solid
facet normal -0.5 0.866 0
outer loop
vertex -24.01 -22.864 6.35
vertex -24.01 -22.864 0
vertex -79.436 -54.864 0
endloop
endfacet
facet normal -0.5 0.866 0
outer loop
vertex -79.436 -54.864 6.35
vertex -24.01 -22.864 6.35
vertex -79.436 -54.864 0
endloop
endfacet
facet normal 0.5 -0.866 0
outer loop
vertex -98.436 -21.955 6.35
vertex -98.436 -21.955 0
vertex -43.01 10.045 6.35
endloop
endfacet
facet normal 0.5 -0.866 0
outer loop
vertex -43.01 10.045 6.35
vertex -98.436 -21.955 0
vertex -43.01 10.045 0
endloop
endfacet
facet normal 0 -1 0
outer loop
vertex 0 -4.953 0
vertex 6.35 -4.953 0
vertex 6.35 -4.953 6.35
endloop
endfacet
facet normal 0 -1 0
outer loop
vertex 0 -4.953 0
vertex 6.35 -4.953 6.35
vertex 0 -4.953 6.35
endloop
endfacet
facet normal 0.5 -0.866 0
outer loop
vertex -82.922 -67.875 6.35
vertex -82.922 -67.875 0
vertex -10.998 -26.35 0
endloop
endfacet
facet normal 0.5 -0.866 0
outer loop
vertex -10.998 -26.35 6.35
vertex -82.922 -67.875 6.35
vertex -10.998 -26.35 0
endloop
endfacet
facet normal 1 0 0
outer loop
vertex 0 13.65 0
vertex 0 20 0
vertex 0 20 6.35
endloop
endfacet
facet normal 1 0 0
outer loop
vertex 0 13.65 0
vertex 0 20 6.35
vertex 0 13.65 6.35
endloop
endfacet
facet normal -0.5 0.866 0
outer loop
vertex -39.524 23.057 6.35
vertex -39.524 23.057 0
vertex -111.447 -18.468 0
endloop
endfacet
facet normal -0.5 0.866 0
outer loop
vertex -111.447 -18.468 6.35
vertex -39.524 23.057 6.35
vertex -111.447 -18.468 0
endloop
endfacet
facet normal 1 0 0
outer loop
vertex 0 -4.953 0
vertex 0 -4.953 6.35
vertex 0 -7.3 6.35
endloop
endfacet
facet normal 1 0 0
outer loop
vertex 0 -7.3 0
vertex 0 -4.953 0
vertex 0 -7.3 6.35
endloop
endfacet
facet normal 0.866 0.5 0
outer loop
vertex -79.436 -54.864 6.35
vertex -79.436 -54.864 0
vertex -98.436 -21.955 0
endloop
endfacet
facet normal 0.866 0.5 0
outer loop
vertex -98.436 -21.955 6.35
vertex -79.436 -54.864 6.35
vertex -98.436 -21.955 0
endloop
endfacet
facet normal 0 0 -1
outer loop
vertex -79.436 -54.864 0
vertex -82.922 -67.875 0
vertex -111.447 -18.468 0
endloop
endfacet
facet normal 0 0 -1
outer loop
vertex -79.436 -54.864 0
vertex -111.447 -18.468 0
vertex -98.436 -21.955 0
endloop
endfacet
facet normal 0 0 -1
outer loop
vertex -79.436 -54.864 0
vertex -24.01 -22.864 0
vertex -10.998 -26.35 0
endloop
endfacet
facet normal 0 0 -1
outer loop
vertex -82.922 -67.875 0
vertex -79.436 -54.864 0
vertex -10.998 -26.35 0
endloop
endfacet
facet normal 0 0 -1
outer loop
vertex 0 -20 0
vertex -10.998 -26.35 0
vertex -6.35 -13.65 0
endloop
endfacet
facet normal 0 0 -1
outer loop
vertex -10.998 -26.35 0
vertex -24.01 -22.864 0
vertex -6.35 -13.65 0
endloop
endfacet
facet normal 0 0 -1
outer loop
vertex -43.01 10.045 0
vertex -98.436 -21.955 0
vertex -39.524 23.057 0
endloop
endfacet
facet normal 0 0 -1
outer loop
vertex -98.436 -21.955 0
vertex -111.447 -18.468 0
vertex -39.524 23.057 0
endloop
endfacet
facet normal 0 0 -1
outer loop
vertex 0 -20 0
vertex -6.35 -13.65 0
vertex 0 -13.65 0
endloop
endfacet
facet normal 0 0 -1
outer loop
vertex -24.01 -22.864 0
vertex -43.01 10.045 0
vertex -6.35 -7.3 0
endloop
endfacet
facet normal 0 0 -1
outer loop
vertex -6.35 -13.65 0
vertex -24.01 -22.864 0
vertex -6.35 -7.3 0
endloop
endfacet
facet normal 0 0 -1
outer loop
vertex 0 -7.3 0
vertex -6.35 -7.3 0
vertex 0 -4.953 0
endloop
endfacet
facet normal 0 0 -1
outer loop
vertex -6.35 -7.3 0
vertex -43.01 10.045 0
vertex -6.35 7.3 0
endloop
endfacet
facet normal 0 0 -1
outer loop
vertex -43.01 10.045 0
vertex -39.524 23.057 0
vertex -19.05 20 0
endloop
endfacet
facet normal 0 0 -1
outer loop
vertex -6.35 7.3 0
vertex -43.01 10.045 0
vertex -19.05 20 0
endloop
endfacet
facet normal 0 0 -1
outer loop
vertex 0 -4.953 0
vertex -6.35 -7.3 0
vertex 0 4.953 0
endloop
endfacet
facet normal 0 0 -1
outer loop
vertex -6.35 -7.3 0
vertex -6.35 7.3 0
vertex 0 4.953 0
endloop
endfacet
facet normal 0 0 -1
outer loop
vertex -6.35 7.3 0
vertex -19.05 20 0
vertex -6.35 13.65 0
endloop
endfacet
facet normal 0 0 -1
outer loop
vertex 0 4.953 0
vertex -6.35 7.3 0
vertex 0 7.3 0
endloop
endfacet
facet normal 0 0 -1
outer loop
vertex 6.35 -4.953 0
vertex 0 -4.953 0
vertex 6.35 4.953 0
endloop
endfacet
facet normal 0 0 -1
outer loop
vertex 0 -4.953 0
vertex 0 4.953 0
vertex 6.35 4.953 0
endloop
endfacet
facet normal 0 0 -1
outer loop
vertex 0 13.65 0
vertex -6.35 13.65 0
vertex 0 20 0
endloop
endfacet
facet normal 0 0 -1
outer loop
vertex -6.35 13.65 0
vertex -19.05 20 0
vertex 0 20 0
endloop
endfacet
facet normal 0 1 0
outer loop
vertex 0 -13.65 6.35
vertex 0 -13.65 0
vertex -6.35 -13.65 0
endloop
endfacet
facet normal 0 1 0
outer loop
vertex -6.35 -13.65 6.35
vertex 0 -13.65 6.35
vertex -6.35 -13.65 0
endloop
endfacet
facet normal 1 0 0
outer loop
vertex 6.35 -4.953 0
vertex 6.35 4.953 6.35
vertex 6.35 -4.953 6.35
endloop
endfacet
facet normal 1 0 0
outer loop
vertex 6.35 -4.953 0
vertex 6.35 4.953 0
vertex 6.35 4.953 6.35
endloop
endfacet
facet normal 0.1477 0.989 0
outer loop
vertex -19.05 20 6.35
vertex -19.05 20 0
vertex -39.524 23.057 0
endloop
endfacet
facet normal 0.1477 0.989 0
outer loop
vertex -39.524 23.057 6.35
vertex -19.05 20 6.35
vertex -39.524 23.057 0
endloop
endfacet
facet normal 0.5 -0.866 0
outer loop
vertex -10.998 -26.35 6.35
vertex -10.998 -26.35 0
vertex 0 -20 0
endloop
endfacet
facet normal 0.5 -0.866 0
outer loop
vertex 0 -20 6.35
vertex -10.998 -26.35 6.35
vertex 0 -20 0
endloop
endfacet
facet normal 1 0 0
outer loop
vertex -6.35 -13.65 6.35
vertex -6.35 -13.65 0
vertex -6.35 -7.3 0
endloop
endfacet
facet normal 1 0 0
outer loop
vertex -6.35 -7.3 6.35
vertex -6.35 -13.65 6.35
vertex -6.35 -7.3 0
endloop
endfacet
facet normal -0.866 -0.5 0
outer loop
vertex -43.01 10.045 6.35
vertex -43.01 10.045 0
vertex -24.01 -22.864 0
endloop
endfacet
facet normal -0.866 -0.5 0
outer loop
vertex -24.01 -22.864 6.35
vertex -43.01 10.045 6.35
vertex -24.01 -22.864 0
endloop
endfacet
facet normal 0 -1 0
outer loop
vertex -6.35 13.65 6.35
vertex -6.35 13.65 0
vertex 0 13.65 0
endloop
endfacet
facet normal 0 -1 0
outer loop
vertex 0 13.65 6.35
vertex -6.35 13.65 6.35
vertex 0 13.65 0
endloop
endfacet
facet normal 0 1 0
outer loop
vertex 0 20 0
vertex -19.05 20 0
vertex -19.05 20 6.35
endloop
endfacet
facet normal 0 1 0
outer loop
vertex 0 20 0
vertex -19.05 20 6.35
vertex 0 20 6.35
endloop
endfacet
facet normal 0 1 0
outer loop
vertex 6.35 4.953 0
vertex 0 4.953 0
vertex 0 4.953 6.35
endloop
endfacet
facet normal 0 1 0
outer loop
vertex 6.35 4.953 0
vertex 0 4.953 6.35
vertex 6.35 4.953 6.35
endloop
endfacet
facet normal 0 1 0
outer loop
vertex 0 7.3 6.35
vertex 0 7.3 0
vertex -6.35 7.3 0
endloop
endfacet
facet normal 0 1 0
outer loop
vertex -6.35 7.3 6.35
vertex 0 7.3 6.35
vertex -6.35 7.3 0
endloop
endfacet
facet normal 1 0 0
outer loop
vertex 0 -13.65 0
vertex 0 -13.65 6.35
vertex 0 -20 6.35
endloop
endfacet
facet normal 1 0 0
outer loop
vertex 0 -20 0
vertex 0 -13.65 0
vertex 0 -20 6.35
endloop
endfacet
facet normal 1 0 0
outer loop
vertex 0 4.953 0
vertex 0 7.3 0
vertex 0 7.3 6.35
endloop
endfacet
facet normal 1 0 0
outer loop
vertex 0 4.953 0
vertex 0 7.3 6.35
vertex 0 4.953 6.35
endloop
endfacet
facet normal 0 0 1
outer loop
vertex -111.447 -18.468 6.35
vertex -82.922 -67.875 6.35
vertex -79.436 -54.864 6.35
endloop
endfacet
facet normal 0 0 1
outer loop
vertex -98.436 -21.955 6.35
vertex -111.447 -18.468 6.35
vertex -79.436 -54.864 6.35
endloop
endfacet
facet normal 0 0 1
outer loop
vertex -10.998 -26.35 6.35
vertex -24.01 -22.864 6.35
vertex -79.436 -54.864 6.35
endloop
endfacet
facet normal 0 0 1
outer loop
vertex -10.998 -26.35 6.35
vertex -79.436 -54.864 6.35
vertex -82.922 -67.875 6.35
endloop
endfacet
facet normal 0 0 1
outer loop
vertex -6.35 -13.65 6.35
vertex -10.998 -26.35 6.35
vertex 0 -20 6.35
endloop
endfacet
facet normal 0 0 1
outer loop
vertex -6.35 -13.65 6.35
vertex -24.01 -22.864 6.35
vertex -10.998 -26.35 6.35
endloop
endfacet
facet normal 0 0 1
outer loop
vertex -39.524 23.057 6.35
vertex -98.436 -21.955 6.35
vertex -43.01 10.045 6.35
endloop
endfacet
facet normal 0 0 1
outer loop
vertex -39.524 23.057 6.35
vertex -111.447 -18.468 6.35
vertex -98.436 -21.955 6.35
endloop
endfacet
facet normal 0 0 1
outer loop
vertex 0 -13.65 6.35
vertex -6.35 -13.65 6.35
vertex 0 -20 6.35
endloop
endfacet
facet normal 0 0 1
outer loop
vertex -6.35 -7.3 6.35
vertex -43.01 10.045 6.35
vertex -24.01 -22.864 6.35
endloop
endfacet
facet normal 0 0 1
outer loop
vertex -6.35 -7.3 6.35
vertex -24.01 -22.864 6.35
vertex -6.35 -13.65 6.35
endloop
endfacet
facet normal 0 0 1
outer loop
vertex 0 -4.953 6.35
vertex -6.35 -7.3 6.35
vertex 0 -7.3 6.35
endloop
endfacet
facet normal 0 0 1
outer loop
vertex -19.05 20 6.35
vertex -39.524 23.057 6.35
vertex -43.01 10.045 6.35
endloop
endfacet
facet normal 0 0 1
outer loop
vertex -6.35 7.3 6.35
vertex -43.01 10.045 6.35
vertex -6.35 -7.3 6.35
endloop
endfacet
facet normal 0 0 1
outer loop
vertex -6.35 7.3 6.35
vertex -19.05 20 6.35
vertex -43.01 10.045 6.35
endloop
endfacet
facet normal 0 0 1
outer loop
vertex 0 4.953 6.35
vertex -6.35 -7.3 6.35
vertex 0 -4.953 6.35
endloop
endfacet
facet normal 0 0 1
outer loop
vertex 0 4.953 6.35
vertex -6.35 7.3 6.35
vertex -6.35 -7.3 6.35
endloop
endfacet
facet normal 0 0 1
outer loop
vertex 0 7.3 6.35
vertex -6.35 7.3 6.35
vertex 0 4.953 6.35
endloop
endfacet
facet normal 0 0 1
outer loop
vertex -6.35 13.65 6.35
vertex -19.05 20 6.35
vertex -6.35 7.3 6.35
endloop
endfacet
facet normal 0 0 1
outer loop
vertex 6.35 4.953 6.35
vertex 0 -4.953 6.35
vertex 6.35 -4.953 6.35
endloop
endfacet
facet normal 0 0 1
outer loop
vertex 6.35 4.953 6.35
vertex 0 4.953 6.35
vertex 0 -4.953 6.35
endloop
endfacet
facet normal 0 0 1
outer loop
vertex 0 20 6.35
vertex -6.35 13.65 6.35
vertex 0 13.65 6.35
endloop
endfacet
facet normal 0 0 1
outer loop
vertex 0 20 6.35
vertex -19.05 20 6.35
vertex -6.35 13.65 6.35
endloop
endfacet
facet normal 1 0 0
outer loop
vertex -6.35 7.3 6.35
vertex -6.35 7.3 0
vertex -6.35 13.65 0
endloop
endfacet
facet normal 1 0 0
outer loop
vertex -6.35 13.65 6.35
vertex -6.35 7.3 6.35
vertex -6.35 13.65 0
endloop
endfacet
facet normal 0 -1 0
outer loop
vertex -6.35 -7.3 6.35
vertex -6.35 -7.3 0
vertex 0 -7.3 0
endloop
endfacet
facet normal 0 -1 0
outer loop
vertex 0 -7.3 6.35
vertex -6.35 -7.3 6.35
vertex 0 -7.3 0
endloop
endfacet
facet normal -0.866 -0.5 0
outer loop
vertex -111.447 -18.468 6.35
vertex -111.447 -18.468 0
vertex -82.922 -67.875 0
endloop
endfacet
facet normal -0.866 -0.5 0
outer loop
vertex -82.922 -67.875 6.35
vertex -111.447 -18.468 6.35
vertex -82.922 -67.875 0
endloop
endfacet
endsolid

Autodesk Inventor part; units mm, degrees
ref_plane "YZ Plane" through (0, 0, 0) normal (1, 0, 0) x (0, 1, 0)
ref_plane "XZ Plane" through (0, 0, 0) normal (0, 1, 0) x (-1, 0, 0)
ref_plane "XY Plane" through (0, 0, 0) normal (0, 0, 1) x (1, 0, 0)
sketch "Sketch1" plane through (0, 0, 0) normal (0, 0, 1) x (1, 0, 0)
  line L0 (-98.4355, -21.9546) -> (-43.0099, 10.0454)
  line L1 (-43.0099, 10.0454) -> (-24.0099, -22.8636)
  line L2 (-24.0099, -22.8636) -> (-79.4355, -54.8636)
  line L3 (-79.4355, -54.8636) -> (-98.4355, -21.9546)
  line L4 (-6.35, -7.3) -> (0, -7.3)
  line L5 (0, -7.3) -> (0, -13.65)
  line L6 (0, -13.65) -> (-6.35, -13.65)
  line L7 (-6.35, -13.65) -> (-6.35, -7.3)
  line L8 (6.35, -4.953) -> (0, -4.953)
  line L9 (0, -4.953) -> (0, 4.953)
  line L10 (0, 4.953) -> (6.35, 4.953)
  line L11 (6.35, 4.953) -> (6.35, -4.953)
  line L12 (-6.35, 13.65) -> (0, 13.65)
  line L13 (0, 13.65) -> (0, 7.3)
  line L14 (0, 7.3) -> (-6.35, 7.3)
  line L15 (-6.35, 7.3) -> (-6.35, 13.65)
  line L16 (0, -20) -> (-19.05, -20)
  line L17 (-19.05, -20) -> (-19.05, 20)
  line L18 (-19.05, 20) -> (0, 20)
  line L19 (0, 20) -> (0, -20)
  line L20 (-10.9985, -26.35) -> (-39.5235, 23.0567)
  line L21 (-39.5235, 23.0567) -> (-111.4469, -18.4683)
  line L22 (-111.4469, -18.4683) -> (-82.9219, -67.875)
  line L23 (-82.9219, -67.875) -> (-10.9985, -26.35)
  line L24 (-10.9985, -26.35) -> (0, -20)
  line L25 (-19.05, 20) -> (-39.5235, 23.0567)
  point P0 (0, 0)
  point P1 (0, 0)
  dimension "d0" = 6.35
  dimension "d2" = 9.906
  dimension "d3" = 40
  dimension "d4" = 6.35
  dimension "d5" = 6.35
  dimension "d6" = 6.35
  dimension "d7" = 38
  dimension "d8" = 64
  dimension "d9" = 9.525
  dimension "d10" = 30
  dimension "d11" = 19.05
  dimension "d12" = 12.7
extrude "Extrusion1" add sketch "Sketch1" along normal blind 6.35 contours L7 L6 L19 L16 L20 L17 L18 L12 L15 L14 L9 L4 | L9 L10 L11 L8 | L24 L20 L16 | L20 L23 L22 L21 L17 L16 | L16 L17 L20 | L20 L25 L17
properties part number "acrylic kinect bracket"
